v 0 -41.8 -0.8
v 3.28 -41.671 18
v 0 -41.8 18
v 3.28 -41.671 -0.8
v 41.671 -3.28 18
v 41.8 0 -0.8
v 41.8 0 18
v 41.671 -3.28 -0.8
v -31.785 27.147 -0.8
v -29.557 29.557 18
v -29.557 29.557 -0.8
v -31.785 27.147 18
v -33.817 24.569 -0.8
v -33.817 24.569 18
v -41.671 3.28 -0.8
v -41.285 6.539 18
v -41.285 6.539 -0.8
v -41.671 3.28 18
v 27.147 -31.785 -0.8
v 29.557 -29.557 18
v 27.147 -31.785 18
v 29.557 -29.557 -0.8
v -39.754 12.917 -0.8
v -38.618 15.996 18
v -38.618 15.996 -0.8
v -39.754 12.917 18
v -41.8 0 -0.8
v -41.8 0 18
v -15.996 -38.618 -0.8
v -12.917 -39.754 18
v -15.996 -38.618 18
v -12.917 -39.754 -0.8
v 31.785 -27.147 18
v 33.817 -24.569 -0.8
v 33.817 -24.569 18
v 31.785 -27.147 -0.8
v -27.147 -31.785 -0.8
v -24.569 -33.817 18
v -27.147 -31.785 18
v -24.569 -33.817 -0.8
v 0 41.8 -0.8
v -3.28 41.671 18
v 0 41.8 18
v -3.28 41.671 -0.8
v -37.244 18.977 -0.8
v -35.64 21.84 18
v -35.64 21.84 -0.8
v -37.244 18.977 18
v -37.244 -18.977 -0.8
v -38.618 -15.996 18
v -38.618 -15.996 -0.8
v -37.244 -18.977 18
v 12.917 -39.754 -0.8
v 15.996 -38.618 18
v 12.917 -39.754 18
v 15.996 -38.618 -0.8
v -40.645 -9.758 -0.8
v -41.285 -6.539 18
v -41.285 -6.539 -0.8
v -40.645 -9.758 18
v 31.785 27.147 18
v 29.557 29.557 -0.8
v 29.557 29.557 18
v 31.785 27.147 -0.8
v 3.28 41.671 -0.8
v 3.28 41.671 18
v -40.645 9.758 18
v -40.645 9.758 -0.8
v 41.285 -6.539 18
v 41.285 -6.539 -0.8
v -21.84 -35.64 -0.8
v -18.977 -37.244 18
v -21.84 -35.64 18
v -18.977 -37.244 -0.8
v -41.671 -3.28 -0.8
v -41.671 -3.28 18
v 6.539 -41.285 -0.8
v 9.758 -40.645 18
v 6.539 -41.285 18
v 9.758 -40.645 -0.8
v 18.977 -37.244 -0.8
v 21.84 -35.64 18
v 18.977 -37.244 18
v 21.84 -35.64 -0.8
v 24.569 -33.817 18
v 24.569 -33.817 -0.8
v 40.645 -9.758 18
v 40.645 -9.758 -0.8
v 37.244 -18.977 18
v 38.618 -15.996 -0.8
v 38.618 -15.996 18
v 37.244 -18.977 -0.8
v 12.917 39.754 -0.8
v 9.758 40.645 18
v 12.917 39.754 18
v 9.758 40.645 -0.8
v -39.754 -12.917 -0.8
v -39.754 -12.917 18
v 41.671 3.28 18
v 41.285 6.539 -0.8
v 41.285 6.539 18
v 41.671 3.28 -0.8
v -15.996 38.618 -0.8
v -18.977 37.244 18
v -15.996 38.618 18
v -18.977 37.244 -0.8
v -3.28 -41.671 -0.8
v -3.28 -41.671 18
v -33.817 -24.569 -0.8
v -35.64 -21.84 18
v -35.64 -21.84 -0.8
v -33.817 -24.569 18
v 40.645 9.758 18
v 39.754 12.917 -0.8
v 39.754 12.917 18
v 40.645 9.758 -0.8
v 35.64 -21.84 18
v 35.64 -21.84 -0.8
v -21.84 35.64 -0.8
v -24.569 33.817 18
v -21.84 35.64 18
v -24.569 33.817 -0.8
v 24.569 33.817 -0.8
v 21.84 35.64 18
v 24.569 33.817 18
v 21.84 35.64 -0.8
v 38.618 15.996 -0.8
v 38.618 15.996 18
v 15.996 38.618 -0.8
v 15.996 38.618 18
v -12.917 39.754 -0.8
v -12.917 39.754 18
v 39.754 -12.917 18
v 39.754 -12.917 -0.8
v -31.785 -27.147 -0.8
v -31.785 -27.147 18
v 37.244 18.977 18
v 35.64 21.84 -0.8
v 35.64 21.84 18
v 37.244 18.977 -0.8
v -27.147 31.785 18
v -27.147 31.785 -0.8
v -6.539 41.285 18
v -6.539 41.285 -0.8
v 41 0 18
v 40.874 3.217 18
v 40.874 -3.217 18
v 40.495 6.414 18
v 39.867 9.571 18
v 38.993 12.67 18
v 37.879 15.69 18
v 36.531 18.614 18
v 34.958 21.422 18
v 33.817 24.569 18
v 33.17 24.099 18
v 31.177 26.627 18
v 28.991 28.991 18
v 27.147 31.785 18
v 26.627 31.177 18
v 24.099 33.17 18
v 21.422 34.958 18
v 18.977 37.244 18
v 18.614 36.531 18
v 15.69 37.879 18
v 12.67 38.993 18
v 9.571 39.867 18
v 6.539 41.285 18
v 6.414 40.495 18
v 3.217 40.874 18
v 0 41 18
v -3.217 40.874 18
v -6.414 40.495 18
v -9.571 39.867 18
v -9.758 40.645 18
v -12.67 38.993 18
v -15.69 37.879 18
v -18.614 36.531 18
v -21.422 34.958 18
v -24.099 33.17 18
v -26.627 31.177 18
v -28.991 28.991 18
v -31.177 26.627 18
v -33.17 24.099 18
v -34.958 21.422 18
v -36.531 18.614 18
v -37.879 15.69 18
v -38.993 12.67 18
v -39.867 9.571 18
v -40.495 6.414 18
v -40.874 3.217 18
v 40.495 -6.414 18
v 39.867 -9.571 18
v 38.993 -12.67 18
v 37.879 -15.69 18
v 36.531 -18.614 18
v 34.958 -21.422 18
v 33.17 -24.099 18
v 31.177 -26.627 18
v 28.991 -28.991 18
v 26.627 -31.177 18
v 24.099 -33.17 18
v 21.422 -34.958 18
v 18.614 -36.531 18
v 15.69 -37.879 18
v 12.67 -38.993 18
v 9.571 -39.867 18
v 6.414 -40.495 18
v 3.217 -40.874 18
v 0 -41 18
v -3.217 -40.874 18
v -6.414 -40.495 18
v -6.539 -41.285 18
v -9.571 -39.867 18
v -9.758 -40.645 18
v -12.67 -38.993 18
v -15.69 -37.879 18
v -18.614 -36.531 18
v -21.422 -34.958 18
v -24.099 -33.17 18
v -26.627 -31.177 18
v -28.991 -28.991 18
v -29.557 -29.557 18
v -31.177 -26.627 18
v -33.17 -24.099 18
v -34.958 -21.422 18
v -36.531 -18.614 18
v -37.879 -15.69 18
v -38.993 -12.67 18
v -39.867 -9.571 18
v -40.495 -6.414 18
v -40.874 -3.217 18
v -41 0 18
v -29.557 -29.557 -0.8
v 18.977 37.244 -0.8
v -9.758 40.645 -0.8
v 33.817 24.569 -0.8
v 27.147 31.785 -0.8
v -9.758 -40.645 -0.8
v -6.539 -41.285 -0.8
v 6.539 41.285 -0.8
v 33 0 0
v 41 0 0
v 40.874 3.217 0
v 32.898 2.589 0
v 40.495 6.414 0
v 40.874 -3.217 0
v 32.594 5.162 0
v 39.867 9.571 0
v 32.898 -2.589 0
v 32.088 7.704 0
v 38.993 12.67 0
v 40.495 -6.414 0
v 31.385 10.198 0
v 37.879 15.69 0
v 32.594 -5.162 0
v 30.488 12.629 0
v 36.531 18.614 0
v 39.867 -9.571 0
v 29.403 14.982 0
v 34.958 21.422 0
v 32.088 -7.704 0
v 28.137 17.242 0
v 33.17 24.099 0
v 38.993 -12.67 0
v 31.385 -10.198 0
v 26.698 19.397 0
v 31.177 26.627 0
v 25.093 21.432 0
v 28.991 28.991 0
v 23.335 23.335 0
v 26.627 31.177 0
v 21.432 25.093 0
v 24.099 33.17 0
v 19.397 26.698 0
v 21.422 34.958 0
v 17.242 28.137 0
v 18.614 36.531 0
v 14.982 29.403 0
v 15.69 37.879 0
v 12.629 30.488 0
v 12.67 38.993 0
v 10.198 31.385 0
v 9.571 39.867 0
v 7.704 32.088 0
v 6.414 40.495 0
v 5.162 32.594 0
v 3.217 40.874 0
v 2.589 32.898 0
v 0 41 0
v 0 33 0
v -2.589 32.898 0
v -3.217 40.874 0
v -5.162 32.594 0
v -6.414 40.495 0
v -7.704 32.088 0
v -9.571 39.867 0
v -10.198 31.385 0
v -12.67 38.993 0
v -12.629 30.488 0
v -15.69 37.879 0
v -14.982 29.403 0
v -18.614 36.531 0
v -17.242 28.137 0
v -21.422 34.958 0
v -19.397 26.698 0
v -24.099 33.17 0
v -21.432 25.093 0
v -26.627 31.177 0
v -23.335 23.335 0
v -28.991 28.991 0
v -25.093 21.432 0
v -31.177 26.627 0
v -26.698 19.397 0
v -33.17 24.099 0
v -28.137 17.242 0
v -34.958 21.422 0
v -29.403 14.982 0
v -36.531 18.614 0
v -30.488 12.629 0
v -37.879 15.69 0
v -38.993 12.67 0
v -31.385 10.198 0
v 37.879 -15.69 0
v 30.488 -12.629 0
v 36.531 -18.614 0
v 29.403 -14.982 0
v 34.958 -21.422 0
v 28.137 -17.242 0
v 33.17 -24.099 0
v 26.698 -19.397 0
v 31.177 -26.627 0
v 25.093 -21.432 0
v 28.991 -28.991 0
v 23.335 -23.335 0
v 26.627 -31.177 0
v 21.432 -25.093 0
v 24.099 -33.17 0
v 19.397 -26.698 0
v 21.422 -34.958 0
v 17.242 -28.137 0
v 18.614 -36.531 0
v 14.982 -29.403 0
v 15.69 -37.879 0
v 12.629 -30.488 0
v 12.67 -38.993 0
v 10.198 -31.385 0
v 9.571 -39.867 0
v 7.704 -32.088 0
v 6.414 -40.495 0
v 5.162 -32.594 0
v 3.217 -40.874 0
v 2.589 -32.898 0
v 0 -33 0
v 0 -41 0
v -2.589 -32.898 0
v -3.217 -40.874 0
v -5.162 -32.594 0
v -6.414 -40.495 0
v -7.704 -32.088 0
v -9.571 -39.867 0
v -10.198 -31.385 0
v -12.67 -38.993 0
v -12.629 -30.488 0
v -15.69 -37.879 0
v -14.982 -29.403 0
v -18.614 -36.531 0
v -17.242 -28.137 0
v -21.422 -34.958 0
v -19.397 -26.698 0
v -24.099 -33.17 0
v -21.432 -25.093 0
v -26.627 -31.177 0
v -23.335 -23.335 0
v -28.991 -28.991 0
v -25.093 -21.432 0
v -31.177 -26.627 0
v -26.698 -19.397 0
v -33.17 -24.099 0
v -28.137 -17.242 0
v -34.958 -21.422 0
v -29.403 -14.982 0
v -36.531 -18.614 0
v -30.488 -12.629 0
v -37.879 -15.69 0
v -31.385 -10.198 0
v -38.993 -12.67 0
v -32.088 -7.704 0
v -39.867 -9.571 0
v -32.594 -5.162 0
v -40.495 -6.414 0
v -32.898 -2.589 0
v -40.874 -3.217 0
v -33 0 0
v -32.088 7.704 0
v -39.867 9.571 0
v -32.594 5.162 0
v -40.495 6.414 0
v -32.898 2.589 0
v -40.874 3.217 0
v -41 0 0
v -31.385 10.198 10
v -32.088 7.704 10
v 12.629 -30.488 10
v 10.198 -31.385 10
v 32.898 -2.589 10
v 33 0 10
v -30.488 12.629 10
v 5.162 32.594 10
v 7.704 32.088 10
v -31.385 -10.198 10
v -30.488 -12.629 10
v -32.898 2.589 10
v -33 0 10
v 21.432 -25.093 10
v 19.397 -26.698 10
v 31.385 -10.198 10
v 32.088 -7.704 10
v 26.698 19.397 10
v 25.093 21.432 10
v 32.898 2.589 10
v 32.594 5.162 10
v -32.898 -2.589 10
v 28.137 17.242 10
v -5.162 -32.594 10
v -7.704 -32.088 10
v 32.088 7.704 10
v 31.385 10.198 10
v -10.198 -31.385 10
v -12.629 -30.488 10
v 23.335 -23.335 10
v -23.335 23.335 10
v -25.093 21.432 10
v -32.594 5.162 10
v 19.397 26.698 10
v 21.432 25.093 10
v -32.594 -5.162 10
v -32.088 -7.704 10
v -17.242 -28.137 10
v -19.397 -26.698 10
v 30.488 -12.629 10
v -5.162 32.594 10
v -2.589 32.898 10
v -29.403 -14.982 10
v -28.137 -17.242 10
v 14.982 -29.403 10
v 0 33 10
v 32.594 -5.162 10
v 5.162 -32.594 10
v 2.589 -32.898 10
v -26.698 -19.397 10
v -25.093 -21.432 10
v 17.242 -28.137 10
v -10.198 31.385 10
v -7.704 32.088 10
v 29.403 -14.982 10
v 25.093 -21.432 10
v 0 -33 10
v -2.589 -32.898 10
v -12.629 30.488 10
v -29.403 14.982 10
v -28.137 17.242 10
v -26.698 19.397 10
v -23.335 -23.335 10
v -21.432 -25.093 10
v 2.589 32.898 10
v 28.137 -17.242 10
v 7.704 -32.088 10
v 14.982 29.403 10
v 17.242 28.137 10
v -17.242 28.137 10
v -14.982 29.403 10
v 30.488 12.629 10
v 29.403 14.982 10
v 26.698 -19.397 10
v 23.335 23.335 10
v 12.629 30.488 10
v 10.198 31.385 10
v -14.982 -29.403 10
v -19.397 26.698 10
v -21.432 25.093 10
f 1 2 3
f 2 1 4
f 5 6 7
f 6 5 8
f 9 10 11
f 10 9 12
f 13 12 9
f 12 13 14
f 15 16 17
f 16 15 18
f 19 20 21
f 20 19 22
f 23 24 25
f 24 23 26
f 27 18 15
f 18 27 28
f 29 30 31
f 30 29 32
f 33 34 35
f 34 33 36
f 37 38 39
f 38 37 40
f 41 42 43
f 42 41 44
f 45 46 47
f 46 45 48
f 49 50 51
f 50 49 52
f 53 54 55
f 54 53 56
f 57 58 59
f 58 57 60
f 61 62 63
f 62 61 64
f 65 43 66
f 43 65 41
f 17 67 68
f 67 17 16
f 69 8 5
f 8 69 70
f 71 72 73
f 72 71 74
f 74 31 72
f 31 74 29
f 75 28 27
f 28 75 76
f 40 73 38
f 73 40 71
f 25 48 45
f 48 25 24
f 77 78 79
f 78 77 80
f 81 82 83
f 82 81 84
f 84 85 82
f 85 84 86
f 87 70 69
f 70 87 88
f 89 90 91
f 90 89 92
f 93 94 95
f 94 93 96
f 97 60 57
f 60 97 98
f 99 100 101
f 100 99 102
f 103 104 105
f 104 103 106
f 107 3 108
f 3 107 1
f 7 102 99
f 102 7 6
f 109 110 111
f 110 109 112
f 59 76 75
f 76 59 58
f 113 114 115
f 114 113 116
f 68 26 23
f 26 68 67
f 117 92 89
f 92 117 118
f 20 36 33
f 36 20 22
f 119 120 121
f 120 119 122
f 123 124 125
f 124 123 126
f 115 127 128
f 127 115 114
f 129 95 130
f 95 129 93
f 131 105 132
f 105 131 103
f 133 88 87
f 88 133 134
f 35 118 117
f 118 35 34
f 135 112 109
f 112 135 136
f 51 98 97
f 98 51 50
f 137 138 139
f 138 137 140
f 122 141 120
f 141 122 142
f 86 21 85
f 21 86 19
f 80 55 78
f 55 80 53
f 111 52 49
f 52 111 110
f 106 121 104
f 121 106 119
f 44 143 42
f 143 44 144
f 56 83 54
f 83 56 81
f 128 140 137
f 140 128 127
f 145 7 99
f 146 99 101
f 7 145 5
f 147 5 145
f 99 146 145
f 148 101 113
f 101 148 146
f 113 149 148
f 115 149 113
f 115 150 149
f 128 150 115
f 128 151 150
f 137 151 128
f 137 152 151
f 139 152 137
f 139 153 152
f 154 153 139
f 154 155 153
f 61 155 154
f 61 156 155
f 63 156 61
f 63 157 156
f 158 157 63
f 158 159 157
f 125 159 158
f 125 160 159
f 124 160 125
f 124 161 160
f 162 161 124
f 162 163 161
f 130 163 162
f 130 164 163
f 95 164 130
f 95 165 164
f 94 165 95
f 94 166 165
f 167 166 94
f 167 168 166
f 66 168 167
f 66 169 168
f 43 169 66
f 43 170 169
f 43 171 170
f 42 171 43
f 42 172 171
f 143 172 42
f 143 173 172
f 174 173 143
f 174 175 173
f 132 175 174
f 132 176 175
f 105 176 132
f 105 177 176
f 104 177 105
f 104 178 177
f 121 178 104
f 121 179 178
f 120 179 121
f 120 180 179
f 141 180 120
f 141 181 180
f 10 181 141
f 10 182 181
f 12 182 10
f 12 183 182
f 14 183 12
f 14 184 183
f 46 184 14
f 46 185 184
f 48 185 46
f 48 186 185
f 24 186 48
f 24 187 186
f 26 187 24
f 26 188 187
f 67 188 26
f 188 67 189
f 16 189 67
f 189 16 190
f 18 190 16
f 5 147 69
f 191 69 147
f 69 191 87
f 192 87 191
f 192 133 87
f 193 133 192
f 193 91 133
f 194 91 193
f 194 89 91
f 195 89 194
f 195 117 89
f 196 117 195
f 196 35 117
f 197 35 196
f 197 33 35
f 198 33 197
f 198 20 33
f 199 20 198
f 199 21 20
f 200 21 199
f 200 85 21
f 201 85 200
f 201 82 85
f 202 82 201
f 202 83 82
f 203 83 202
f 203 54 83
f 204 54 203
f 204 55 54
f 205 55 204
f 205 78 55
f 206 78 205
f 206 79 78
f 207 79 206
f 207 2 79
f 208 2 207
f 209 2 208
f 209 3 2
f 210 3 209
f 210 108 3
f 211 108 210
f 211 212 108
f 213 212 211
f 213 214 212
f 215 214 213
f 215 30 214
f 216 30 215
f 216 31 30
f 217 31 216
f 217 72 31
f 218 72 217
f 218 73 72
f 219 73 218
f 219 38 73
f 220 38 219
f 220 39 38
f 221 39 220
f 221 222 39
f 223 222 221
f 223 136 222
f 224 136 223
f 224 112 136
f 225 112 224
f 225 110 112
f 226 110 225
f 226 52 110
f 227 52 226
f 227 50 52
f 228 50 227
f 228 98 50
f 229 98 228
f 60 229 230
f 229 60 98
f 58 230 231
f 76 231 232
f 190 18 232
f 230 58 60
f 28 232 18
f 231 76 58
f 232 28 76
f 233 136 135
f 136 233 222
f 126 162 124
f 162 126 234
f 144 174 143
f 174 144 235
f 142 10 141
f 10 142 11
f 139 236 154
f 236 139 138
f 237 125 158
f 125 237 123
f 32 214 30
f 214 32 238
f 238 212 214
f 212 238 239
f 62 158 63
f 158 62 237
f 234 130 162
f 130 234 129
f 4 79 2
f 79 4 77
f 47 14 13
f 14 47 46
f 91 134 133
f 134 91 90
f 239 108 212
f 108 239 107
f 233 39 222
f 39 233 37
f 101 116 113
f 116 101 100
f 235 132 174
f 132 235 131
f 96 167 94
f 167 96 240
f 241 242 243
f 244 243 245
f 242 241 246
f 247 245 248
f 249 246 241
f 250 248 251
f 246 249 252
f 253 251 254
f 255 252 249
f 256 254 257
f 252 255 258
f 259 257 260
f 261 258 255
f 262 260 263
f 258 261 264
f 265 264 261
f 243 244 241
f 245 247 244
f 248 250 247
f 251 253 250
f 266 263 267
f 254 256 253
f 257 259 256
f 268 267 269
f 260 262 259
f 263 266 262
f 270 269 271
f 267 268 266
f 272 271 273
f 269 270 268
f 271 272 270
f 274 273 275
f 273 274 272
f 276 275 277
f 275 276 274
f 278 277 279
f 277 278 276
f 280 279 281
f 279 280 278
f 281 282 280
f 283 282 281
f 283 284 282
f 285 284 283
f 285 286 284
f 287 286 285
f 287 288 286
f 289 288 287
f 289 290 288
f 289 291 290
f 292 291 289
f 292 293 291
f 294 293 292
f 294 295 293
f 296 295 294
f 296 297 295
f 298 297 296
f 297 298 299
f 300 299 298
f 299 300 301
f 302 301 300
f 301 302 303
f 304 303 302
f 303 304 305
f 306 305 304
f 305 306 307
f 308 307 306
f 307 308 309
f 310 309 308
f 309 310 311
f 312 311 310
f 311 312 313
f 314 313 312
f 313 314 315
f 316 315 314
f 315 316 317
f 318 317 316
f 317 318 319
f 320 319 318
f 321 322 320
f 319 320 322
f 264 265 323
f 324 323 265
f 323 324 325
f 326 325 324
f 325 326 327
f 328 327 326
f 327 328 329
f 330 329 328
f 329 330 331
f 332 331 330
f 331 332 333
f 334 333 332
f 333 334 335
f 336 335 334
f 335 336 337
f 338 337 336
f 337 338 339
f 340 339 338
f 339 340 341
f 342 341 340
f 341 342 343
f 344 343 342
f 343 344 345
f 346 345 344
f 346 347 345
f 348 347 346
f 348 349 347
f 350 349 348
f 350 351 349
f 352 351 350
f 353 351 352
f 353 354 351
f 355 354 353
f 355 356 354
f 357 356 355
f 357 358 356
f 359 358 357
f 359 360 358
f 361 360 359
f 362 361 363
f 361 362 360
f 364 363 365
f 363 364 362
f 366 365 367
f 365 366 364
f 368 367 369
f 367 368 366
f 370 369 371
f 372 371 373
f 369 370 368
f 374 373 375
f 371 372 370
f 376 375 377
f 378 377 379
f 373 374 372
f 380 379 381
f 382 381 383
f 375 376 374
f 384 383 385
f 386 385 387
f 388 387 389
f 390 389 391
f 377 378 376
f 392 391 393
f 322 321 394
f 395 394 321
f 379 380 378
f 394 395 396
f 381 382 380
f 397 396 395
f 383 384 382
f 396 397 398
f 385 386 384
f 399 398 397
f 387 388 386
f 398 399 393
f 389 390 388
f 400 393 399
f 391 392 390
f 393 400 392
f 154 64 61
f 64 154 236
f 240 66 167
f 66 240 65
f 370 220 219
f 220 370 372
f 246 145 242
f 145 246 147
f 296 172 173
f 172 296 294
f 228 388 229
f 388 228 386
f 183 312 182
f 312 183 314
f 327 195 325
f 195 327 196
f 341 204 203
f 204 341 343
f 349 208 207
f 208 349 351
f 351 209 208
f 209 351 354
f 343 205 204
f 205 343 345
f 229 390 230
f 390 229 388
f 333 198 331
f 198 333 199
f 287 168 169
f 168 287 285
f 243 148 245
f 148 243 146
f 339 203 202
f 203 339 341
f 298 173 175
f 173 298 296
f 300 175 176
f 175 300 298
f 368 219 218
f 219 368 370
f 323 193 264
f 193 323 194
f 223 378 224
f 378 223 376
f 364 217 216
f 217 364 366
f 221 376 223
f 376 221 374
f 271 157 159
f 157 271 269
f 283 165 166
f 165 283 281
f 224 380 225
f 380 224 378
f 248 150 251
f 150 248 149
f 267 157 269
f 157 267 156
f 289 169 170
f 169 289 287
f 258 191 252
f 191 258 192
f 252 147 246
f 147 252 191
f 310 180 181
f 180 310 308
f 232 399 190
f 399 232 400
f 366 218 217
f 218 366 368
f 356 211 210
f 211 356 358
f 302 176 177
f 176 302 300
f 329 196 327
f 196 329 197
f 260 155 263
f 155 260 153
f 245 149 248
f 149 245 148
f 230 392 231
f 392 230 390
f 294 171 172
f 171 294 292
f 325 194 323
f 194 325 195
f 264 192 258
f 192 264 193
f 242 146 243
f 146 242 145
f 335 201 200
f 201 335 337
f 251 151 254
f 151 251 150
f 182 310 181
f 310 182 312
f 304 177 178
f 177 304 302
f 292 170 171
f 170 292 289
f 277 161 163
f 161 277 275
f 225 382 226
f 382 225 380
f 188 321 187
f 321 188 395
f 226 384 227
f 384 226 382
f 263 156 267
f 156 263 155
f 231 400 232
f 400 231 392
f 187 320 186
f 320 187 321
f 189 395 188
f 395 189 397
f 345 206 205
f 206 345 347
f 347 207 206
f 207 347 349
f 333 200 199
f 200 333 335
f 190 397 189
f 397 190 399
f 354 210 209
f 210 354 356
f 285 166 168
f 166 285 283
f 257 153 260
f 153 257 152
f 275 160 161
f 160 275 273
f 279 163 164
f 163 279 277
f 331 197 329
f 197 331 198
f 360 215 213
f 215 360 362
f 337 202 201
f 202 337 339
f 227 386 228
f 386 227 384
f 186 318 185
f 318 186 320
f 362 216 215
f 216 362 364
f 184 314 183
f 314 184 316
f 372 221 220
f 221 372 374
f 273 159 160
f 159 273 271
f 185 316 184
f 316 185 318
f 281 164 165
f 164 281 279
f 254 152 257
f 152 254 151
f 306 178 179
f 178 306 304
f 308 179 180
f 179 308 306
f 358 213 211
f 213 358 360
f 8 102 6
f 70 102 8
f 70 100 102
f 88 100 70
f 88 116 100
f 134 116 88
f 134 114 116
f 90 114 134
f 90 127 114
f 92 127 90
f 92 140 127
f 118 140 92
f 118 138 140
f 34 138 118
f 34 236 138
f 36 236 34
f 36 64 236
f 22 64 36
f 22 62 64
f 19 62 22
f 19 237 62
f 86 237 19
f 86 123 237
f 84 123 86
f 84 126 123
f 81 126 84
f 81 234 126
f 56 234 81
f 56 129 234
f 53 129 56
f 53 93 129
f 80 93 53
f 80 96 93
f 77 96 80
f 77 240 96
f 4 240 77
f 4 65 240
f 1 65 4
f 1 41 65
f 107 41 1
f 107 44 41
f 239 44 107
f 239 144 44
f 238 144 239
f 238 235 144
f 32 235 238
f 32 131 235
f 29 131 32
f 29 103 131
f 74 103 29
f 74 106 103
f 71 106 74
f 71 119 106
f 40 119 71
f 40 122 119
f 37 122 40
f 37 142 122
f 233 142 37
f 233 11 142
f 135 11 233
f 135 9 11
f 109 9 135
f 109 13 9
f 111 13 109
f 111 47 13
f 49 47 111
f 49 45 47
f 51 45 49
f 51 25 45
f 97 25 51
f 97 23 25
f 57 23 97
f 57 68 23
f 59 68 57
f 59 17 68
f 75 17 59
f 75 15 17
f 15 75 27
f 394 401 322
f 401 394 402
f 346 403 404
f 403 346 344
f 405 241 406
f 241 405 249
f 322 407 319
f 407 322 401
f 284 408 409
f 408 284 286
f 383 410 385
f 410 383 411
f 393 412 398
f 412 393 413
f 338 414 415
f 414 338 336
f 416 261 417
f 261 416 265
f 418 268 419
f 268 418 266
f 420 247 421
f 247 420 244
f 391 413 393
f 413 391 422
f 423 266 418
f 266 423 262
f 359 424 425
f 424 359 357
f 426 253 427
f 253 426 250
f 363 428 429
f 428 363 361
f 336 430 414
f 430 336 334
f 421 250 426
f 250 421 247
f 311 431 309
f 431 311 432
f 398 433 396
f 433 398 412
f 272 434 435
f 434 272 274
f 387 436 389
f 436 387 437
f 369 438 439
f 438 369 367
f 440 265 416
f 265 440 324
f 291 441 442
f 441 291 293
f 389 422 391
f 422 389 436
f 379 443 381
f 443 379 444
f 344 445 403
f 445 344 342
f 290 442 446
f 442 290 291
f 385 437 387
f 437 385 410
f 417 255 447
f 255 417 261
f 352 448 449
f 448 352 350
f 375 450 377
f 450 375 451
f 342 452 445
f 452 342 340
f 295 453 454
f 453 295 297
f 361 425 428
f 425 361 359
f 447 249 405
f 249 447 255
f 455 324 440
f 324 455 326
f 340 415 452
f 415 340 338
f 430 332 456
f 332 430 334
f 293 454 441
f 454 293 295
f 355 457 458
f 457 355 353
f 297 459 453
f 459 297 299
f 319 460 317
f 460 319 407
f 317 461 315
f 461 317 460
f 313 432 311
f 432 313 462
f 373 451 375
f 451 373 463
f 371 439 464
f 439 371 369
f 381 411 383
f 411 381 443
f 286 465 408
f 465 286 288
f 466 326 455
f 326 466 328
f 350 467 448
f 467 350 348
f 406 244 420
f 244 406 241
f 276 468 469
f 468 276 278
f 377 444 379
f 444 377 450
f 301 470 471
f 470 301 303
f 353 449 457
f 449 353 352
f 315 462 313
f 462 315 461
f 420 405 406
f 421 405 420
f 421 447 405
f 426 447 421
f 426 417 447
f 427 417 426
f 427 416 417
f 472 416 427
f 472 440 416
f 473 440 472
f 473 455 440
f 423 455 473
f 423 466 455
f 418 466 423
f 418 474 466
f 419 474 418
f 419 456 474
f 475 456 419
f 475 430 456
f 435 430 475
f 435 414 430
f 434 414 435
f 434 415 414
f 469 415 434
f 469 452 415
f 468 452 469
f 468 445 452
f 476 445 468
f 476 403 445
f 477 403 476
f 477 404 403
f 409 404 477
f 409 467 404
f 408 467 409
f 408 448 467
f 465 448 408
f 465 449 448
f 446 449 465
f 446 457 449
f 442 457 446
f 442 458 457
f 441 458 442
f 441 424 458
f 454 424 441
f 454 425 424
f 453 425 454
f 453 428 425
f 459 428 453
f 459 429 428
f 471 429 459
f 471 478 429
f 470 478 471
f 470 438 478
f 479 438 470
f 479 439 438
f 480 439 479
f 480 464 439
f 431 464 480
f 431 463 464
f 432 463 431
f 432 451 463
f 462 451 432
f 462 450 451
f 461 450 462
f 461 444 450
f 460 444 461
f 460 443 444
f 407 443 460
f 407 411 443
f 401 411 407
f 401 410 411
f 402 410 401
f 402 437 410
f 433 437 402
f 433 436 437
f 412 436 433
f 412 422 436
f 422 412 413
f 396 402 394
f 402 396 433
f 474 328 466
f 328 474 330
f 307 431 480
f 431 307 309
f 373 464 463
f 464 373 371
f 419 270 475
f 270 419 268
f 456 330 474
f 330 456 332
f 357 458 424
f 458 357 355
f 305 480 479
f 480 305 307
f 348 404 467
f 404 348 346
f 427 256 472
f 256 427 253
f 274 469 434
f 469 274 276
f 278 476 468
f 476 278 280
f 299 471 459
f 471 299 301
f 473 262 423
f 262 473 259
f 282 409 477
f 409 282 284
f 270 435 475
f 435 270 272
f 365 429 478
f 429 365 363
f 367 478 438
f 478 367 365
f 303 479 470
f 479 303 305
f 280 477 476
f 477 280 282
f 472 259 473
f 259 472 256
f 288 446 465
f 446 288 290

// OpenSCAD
$fn = 80;

radius = 33;
base_depth = 0.2*4;
gap = 8;
border = 0.8;
height = 18;

module positive() {
    d = 10;
    linear_extrude(d)
        circle(r=radius);
}

module box() {
    translate([0,0,-base_depth]) linear_extrude(base_depth)
        circle(r=radius+gap+border);
    
    difference() {
        linear_extrude(height) circle(r=radius+gap+border);
        linear_extrude(height+1) circle(r=radius+gap);
    }
}

positive();
box();
